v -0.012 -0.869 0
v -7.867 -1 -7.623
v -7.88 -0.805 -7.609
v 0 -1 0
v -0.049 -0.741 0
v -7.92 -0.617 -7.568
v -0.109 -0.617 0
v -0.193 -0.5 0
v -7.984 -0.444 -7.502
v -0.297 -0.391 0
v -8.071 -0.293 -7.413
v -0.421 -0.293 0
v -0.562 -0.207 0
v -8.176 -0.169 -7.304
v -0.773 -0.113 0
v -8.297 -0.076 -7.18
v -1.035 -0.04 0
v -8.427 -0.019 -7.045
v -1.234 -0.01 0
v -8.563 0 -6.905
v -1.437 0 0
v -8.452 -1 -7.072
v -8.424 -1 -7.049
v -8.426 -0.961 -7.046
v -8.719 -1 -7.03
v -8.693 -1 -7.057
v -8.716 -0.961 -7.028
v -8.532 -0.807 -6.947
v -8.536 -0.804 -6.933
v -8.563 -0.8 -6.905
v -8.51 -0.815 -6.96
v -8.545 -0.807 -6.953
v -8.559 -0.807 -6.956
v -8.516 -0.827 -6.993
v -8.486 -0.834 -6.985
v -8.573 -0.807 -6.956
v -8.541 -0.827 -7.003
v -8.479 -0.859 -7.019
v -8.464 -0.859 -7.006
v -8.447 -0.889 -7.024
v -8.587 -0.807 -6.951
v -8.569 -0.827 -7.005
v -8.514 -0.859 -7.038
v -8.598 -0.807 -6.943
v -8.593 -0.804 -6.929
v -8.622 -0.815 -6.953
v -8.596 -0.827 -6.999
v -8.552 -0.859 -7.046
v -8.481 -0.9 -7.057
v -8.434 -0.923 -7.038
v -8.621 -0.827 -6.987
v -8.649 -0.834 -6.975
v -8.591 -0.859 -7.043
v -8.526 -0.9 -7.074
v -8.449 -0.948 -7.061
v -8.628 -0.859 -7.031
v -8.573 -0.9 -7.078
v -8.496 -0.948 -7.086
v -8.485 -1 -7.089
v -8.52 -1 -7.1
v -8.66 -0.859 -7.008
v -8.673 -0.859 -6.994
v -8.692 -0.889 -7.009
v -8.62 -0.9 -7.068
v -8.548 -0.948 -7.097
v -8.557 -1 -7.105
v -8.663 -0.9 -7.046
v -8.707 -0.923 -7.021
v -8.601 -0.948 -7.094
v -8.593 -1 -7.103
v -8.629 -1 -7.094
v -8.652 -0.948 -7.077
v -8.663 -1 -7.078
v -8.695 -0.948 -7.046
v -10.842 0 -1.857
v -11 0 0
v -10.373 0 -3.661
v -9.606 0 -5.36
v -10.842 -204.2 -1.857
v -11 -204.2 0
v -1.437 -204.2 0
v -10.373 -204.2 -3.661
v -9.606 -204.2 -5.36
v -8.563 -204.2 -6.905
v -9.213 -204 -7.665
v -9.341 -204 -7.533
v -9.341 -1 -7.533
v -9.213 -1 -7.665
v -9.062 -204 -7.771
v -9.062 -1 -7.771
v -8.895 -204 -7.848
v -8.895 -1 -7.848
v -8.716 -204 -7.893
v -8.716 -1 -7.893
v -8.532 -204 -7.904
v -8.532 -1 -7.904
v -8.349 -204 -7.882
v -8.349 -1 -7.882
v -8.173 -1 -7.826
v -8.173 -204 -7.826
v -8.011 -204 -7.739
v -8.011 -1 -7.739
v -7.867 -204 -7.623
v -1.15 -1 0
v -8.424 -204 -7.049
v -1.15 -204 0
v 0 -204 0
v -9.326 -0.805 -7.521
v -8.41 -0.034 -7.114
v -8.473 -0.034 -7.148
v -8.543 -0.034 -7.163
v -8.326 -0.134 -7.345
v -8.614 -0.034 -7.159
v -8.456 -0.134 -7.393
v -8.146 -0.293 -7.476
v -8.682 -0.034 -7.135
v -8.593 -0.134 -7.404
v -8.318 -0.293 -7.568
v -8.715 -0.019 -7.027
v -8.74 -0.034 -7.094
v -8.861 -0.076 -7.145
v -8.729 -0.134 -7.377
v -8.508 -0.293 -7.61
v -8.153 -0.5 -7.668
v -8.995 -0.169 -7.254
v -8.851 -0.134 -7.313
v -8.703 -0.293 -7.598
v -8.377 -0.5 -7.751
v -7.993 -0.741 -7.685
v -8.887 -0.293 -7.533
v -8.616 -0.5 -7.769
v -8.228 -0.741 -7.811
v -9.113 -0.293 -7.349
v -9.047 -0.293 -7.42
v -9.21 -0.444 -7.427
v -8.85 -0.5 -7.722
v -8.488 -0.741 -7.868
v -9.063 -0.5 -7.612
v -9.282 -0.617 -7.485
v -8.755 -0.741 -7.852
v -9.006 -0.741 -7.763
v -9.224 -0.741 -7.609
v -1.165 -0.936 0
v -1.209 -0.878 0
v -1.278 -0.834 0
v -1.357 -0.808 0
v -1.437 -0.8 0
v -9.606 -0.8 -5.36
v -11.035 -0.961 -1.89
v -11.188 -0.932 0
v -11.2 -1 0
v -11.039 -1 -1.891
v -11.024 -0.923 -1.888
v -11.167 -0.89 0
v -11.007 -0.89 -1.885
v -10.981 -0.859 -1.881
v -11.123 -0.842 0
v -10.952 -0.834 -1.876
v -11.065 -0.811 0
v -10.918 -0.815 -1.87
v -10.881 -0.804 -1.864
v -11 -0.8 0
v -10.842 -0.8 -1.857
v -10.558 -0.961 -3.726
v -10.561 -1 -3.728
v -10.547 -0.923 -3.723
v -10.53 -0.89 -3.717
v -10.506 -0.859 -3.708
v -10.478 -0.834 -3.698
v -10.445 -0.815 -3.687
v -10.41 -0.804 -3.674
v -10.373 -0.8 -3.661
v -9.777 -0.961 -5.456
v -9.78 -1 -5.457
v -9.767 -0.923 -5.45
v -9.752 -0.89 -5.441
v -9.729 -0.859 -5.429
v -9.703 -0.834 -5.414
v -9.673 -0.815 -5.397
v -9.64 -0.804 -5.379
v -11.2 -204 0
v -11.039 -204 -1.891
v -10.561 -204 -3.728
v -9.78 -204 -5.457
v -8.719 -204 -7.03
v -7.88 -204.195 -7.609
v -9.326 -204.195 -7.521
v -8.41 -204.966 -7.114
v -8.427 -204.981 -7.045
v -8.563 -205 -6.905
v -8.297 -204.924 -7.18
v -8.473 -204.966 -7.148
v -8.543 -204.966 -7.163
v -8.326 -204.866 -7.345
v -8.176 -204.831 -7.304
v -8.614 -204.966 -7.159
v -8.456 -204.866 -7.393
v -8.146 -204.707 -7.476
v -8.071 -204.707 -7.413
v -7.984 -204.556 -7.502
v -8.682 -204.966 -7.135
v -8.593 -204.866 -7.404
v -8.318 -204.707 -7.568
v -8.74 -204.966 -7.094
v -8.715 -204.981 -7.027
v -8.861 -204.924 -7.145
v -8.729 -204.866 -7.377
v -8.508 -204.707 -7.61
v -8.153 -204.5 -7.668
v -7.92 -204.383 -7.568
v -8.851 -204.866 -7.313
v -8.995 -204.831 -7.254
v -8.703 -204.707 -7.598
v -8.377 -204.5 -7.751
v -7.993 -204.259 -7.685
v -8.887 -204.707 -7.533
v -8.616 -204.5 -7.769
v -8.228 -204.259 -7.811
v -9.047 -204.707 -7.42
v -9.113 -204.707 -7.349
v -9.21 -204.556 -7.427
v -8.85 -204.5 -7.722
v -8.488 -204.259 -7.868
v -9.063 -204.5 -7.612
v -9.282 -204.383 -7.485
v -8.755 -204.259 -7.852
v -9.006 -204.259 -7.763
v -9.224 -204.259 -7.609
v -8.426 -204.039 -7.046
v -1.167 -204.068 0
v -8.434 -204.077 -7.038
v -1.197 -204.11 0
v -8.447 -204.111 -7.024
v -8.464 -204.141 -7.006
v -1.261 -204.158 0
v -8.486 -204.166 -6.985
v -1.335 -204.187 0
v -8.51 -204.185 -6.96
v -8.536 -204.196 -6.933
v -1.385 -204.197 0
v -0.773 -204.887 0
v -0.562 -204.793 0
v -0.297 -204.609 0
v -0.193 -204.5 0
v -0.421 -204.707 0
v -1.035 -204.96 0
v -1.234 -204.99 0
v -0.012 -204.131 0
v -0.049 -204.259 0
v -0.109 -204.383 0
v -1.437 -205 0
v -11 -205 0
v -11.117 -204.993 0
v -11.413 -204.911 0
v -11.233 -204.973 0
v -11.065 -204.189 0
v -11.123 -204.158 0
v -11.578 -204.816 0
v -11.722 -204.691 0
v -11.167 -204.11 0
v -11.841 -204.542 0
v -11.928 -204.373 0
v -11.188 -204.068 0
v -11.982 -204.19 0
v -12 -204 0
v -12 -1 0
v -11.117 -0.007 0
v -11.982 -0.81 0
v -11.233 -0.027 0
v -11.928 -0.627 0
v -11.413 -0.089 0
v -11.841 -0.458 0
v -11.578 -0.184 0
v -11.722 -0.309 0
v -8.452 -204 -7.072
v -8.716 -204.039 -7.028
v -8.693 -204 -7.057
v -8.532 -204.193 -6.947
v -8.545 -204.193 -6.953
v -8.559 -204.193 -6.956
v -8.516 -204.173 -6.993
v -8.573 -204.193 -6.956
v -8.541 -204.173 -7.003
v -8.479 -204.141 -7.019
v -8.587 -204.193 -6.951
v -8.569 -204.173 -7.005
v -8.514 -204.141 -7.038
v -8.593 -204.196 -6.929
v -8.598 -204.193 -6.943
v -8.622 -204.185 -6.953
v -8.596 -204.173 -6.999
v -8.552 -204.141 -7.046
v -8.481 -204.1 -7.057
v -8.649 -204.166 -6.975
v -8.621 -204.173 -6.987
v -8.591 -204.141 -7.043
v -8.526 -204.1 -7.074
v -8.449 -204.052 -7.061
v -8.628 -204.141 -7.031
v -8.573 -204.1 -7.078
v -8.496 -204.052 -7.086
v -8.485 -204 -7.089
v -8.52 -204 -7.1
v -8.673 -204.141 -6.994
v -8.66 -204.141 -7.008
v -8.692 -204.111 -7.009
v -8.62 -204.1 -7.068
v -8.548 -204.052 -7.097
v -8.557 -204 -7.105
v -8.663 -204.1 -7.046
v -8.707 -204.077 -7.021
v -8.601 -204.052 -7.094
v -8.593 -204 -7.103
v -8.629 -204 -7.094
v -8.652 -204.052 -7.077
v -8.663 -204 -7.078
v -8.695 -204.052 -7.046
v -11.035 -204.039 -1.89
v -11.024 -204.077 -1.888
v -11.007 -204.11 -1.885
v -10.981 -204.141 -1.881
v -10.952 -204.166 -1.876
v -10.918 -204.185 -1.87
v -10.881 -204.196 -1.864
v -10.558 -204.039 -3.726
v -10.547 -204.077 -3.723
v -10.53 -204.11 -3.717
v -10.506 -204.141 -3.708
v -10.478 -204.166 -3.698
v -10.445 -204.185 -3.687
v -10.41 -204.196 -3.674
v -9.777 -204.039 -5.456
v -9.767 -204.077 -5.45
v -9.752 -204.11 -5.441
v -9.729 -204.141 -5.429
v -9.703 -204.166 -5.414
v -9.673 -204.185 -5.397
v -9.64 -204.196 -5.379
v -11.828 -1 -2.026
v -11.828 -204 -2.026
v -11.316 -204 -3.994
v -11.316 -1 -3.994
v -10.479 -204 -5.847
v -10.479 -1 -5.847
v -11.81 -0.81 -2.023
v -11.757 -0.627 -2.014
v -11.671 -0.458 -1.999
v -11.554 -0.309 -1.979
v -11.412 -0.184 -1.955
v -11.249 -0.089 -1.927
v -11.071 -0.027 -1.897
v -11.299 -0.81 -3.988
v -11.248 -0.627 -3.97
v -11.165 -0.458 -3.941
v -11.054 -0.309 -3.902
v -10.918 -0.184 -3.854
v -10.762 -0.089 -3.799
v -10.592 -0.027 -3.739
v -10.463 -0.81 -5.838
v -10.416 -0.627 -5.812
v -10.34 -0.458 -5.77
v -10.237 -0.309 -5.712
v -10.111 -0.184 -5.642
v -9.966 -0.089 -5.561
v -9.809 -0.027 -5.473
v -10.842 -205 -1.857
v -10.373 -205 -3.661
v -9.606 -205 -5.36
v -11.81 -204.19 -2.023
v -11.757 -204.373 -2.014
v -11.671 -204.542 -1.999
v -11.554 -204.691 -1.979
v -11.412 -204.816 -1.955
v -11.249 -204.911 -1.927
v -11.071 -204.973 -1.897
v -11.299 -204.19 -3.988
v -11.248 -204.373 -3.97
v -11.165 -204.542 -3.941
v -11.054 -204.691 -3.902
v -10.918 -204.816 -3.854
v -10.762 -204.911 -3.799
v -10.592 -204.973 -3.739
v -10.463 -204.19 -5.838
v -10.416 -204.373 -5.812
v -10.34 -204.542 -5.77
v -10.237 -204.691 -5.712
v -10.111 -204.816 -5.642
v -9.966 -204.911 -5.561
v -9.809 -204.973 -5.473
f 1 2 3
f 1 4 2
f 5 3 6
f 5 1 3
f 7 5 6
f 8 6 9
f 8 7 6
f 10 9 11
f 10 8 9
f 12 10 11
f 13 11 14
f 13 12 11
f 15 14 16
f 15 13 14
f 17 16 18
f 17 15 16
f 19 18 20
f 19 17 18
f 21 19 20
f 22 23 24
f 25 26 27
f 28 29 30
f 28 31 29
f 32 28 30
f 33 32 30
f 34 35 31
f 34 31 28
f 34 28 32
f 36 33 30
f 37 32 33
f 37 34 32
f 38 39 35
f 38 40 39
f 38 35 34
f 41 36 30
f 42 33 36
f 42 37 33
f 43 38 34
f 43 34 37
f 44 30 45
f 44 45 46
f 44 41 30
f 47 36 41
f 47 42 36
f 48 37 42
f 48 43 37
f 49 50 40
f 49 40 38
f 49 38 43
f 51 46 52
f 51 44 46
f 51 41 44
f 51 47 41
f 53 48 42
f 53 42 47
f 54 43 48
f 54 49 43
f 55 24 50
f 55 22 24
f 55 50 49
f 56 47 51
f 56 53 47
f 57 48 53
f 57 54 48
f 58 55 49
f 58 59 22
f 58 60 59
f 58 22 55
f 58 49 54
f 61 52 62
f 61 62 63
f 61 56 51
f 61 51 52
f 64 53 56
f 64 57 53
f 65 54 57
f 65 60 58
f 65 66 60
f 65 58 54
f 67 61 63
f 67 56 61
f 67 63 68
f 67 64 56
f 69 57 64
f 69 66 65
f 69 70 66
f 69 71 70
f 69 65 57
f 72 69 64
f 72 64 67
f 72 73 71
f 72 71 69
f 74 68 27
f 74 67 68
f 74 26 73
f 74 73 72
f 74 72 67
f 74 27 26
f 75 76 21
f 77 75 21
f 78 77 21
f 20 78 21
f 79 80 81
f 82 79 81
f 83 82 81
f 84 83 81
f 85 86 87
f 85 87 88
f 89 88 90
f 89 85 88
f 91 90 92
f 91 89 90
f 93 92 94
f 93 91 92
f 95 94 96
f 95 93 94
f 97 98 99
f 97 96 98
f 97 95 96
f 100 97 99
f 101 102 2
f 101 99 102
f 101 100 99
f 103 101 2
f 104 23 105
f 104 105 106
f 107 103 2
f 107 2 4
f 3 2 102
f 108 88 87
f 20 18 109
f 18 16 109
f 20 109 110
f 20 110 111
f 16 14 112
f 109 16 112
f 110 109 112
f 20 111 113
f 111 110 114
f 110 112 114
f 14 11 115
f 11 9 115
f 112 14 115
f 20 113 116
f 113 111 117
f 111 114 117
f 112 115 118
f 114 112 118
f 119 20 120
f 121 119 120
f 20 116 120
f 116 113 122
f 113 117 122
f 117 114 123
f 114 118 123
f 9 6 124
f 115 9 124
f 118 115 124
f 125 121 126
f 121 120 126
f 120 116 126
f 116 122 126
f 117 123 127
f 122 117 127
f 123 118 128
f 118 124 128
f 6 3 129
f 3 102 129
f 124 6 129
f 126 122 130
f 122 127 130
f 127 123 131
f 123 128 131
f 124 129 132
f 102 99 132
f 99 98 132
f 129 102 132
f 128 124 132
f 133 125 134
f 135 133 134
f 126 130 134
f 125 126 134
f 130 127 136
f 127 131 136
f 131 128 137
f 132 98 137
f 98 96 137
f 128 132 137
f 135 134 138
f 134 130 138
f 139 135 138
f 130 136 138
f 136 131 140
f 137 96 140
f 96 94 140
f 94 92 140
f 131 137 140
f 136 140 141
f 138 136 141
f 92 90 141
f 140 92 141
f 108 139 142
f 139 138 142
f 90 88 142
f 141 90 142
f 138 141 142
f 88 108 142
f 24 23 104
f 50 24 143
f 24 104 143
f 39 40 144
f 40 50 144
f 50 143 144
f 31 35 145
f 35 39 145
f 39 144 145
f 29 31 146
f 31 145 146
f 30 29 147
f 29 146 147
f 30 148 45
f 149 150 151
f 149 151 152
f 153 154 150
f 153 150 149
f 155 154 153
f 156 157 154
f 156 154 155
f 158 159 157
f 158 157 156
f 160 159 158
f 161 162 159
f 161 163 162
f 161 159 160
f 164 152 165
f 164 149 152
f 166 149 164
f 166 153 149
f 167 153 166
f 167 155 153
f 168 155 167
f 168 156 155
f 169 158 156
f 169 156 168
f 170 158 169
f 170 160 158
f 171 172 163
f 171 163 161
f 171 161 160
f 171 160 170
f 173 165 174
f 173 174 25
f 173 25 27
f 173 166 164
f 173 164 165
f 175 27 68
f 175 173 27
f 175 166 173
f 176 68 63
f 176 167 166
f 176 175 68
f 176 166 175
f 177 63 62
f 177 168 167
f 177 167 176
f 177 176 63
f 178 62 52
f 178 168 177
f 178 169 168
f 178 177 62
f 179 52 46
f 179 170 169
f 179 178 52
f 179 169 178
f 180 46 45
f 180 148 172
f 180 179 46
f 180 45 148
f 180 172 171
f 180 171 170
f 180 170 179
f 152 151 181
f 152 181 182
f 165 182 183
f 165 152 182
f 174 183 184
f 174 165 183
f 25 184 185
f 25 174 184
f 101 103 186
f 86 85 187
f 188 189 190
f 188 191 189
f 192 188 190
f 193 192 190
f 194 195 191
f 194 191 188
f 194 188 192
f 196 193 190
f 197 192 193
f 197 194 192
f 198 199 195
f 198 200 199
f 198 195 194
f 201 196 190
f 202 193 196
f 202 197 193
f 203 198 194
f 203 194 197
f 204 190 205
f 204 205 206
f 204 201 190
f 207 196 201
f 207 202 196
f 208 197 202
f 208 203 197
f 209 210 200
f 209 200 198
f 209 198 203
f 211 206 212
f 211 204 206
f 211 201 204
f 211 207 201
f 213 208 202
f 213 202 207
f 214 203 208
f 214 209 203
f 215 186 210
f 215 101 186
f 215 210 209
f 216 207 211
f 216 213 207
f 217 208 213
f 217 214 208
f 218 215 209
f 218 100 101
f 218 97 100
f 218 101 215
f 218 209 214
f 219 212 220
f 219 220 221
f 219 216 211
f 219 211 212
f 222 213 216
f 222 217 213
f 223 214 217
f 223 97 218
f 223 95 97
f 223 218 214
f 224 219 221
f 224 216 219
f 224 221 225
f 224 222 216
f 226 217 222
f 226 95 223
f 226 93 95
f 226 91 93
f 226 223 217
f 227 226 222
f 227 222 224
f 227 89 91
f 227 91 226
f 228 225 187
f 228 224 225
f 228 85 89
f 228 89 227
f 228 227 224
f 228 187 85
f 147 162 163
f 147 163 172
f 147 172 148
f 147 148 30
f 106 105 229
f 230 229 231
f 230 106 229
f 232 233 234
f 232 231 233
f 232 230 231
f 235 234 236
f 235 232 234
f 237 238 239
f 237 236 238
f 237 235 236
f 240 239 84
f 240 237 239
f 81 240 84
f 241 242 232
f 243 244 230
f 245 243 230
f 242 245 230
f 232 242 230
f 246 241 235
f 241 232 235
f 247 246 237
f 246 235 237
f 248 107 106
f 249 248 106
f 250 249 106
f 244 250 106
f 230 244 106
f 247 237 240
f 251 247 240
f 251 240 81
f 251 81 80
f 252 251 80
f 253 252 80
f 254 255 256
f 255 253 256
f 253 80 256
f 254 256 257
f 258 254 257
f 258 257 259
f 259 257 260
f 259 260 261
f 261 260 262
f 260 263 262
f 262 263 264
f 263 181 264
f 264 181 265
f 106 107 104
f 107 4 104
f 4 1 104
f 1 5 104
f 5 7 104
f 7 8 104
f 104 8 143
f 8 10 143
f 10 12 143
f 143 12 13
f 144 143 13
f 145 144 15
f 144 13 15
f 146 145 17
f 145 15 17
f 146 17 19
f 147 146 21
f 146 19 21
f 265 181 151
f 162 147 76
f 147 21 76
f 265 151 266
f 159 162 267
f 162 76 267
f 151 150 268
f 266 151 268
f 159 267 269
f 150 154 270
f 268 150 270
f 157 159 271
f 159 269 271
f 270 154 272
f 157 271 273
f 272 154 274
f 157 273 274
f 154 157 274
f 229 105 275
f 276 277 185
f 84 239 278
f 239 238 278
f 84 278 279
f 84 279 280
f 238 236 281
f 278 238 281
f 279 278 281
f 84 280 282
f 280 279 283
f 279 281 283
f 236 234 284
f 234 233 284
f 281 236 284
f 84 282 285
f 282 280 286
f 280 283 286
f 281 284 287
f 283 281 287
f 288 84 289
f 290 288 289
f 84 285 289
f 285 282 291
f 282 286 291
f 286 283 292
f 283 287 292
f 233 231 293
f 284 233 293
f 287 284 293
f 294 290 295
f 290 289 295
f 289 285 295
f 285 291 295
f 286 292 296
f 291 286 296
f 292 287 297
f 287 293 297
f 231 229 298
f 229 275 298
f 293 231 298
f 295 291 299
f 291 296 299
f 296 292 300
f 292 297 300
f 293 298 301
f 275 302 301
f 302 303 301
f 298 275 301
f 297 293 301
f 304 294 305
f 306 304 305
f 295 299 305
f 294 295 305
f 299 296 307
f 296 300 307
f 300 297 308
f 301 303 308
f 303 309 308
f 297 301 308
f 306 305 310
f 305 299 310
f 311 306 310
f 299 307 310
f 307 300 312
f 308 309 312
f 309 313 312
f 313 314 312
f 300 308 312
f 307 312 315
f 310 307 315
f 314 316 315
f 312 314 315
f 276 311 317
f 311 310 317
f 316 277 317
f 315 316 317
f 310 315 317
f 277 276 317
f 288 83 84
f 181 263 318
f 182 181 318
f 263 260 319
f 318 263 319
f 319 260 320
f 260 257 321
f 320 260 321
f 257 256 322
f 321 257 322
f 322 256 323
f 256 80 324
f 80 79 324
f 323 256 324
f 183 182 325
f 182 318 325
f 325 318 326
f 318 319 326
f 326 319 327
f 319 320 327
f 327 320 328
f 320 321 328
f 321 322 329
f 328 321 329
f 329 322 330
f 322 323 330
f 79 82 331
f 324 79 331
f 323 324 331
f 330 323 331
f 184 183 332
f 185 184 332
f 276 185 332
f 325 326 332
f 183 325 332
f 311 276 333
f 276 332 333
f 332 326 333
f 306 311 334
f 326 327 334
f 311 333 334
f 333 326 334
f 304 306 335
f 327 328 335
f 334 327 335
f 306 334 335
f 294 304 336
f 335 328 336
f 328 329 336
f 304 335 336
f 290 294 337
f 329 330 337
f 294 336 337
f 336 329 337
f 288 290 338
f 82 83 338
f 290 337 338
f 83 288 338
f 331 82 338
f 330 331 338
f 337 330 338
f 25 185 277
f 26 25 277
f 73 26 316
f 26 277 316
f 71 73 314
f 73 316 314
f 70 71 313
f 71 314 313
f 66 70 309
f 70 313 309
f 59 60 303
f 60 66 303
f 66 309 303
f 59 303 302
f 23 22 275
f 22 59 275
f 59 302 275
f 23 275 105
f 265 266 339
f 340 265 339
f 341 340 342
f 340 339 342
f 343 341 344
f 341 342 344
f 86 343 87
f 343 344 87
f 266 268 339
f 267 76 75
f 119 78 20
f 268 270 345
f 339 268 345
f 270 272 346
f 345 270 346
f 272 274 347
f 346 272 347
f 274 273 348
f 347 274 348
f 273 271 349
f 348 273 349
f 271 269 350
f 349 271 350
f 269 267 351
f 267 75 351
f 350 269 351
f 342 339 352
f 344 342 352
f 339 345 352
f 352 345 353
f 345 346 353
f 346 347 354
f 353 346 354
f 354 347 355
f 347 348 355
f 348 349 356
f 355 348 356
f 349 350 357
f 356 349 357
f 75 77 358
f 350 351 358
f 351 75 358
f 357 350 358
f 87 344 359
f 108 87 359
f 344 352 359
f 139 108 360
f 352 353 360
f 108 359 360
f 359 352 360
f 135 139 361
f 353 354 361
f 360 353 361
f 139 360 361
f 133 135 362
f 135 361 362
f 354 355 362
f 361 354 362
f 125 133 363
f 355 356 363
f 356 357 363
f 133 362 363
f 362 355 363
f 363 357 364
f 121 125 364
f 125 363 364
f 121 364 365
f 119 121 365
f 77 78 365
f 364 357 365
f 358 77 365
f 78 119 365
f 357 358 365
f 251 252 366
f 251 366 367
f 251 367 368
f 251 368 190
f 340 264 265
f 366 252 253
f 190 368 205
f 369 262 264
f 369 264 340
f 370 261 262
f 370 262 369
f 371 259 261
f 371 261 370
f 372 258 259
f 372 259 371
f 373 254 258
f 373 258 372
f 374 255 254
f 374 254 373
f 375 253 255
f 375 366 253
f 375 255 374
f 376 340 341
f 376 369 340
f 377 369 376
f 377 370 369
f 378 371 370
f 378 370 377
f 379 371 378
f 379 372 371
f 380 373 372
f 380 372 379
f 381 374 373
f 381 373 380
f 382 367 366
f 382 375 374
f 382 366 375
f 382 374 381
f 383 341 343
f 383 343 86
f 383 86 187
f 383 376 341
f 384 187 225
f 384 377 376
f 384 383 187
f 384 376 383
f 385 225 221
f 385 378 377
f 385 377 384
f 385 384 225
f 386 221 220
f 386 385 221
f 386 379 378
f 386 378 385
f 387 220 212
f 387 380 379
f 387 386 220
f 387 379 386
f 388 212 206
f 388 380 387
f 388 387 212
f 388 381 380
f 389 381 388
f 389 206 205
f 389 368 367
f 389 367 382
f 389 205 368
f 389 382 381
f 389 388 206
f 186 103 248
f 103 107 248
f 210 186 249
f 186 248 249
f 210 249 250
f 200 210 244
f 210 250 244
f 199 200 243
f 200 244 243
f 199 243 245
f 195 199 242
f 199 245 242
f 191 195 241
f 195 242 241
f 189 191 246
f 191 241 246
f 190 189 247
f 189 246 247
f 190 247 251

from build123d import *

# Parameters (mm, degrees)
F1_DEPTH = 205
F2_R     = 1
F3_T     = -0.8


with BuildPart() as f1:
    # F0 (on Front) → F1 (new body)
    with BuildSketch(Plane.XZ):
        with BuildLine():
            Line((0, 0), (-12, 0))
            ThreePointArc((-12, 0), (-11.122366, -4.504771), (-8.617839, -8.35062))
            Line((-8.617839, -8.35062), (0, 0))
        make_face()
    extrude(amount=F1_DEPTH)

    # F2
    f2_edges = [f1.edges().sort_by_distance(p)[0] for p in [
        (-8.617839, -102.5, -8.35062),
        (-4.30892, -205, -4.17531),
        (-11.122366, -205, -4.504771),
        (-4.30892, 0, -4.17531),
        (-11.122366, 0, -4.504771),
    ]]
    fillet(f2_edges, radius=F2_R)

    # F3
    f3_openings = [f1.faces().sort_by_distance(p)[0] for p in [
        (-6.000416, -102.5, 0),
    ]]
    offset(amount=F3_T, openings=f3_openings)


solid = f1.part
